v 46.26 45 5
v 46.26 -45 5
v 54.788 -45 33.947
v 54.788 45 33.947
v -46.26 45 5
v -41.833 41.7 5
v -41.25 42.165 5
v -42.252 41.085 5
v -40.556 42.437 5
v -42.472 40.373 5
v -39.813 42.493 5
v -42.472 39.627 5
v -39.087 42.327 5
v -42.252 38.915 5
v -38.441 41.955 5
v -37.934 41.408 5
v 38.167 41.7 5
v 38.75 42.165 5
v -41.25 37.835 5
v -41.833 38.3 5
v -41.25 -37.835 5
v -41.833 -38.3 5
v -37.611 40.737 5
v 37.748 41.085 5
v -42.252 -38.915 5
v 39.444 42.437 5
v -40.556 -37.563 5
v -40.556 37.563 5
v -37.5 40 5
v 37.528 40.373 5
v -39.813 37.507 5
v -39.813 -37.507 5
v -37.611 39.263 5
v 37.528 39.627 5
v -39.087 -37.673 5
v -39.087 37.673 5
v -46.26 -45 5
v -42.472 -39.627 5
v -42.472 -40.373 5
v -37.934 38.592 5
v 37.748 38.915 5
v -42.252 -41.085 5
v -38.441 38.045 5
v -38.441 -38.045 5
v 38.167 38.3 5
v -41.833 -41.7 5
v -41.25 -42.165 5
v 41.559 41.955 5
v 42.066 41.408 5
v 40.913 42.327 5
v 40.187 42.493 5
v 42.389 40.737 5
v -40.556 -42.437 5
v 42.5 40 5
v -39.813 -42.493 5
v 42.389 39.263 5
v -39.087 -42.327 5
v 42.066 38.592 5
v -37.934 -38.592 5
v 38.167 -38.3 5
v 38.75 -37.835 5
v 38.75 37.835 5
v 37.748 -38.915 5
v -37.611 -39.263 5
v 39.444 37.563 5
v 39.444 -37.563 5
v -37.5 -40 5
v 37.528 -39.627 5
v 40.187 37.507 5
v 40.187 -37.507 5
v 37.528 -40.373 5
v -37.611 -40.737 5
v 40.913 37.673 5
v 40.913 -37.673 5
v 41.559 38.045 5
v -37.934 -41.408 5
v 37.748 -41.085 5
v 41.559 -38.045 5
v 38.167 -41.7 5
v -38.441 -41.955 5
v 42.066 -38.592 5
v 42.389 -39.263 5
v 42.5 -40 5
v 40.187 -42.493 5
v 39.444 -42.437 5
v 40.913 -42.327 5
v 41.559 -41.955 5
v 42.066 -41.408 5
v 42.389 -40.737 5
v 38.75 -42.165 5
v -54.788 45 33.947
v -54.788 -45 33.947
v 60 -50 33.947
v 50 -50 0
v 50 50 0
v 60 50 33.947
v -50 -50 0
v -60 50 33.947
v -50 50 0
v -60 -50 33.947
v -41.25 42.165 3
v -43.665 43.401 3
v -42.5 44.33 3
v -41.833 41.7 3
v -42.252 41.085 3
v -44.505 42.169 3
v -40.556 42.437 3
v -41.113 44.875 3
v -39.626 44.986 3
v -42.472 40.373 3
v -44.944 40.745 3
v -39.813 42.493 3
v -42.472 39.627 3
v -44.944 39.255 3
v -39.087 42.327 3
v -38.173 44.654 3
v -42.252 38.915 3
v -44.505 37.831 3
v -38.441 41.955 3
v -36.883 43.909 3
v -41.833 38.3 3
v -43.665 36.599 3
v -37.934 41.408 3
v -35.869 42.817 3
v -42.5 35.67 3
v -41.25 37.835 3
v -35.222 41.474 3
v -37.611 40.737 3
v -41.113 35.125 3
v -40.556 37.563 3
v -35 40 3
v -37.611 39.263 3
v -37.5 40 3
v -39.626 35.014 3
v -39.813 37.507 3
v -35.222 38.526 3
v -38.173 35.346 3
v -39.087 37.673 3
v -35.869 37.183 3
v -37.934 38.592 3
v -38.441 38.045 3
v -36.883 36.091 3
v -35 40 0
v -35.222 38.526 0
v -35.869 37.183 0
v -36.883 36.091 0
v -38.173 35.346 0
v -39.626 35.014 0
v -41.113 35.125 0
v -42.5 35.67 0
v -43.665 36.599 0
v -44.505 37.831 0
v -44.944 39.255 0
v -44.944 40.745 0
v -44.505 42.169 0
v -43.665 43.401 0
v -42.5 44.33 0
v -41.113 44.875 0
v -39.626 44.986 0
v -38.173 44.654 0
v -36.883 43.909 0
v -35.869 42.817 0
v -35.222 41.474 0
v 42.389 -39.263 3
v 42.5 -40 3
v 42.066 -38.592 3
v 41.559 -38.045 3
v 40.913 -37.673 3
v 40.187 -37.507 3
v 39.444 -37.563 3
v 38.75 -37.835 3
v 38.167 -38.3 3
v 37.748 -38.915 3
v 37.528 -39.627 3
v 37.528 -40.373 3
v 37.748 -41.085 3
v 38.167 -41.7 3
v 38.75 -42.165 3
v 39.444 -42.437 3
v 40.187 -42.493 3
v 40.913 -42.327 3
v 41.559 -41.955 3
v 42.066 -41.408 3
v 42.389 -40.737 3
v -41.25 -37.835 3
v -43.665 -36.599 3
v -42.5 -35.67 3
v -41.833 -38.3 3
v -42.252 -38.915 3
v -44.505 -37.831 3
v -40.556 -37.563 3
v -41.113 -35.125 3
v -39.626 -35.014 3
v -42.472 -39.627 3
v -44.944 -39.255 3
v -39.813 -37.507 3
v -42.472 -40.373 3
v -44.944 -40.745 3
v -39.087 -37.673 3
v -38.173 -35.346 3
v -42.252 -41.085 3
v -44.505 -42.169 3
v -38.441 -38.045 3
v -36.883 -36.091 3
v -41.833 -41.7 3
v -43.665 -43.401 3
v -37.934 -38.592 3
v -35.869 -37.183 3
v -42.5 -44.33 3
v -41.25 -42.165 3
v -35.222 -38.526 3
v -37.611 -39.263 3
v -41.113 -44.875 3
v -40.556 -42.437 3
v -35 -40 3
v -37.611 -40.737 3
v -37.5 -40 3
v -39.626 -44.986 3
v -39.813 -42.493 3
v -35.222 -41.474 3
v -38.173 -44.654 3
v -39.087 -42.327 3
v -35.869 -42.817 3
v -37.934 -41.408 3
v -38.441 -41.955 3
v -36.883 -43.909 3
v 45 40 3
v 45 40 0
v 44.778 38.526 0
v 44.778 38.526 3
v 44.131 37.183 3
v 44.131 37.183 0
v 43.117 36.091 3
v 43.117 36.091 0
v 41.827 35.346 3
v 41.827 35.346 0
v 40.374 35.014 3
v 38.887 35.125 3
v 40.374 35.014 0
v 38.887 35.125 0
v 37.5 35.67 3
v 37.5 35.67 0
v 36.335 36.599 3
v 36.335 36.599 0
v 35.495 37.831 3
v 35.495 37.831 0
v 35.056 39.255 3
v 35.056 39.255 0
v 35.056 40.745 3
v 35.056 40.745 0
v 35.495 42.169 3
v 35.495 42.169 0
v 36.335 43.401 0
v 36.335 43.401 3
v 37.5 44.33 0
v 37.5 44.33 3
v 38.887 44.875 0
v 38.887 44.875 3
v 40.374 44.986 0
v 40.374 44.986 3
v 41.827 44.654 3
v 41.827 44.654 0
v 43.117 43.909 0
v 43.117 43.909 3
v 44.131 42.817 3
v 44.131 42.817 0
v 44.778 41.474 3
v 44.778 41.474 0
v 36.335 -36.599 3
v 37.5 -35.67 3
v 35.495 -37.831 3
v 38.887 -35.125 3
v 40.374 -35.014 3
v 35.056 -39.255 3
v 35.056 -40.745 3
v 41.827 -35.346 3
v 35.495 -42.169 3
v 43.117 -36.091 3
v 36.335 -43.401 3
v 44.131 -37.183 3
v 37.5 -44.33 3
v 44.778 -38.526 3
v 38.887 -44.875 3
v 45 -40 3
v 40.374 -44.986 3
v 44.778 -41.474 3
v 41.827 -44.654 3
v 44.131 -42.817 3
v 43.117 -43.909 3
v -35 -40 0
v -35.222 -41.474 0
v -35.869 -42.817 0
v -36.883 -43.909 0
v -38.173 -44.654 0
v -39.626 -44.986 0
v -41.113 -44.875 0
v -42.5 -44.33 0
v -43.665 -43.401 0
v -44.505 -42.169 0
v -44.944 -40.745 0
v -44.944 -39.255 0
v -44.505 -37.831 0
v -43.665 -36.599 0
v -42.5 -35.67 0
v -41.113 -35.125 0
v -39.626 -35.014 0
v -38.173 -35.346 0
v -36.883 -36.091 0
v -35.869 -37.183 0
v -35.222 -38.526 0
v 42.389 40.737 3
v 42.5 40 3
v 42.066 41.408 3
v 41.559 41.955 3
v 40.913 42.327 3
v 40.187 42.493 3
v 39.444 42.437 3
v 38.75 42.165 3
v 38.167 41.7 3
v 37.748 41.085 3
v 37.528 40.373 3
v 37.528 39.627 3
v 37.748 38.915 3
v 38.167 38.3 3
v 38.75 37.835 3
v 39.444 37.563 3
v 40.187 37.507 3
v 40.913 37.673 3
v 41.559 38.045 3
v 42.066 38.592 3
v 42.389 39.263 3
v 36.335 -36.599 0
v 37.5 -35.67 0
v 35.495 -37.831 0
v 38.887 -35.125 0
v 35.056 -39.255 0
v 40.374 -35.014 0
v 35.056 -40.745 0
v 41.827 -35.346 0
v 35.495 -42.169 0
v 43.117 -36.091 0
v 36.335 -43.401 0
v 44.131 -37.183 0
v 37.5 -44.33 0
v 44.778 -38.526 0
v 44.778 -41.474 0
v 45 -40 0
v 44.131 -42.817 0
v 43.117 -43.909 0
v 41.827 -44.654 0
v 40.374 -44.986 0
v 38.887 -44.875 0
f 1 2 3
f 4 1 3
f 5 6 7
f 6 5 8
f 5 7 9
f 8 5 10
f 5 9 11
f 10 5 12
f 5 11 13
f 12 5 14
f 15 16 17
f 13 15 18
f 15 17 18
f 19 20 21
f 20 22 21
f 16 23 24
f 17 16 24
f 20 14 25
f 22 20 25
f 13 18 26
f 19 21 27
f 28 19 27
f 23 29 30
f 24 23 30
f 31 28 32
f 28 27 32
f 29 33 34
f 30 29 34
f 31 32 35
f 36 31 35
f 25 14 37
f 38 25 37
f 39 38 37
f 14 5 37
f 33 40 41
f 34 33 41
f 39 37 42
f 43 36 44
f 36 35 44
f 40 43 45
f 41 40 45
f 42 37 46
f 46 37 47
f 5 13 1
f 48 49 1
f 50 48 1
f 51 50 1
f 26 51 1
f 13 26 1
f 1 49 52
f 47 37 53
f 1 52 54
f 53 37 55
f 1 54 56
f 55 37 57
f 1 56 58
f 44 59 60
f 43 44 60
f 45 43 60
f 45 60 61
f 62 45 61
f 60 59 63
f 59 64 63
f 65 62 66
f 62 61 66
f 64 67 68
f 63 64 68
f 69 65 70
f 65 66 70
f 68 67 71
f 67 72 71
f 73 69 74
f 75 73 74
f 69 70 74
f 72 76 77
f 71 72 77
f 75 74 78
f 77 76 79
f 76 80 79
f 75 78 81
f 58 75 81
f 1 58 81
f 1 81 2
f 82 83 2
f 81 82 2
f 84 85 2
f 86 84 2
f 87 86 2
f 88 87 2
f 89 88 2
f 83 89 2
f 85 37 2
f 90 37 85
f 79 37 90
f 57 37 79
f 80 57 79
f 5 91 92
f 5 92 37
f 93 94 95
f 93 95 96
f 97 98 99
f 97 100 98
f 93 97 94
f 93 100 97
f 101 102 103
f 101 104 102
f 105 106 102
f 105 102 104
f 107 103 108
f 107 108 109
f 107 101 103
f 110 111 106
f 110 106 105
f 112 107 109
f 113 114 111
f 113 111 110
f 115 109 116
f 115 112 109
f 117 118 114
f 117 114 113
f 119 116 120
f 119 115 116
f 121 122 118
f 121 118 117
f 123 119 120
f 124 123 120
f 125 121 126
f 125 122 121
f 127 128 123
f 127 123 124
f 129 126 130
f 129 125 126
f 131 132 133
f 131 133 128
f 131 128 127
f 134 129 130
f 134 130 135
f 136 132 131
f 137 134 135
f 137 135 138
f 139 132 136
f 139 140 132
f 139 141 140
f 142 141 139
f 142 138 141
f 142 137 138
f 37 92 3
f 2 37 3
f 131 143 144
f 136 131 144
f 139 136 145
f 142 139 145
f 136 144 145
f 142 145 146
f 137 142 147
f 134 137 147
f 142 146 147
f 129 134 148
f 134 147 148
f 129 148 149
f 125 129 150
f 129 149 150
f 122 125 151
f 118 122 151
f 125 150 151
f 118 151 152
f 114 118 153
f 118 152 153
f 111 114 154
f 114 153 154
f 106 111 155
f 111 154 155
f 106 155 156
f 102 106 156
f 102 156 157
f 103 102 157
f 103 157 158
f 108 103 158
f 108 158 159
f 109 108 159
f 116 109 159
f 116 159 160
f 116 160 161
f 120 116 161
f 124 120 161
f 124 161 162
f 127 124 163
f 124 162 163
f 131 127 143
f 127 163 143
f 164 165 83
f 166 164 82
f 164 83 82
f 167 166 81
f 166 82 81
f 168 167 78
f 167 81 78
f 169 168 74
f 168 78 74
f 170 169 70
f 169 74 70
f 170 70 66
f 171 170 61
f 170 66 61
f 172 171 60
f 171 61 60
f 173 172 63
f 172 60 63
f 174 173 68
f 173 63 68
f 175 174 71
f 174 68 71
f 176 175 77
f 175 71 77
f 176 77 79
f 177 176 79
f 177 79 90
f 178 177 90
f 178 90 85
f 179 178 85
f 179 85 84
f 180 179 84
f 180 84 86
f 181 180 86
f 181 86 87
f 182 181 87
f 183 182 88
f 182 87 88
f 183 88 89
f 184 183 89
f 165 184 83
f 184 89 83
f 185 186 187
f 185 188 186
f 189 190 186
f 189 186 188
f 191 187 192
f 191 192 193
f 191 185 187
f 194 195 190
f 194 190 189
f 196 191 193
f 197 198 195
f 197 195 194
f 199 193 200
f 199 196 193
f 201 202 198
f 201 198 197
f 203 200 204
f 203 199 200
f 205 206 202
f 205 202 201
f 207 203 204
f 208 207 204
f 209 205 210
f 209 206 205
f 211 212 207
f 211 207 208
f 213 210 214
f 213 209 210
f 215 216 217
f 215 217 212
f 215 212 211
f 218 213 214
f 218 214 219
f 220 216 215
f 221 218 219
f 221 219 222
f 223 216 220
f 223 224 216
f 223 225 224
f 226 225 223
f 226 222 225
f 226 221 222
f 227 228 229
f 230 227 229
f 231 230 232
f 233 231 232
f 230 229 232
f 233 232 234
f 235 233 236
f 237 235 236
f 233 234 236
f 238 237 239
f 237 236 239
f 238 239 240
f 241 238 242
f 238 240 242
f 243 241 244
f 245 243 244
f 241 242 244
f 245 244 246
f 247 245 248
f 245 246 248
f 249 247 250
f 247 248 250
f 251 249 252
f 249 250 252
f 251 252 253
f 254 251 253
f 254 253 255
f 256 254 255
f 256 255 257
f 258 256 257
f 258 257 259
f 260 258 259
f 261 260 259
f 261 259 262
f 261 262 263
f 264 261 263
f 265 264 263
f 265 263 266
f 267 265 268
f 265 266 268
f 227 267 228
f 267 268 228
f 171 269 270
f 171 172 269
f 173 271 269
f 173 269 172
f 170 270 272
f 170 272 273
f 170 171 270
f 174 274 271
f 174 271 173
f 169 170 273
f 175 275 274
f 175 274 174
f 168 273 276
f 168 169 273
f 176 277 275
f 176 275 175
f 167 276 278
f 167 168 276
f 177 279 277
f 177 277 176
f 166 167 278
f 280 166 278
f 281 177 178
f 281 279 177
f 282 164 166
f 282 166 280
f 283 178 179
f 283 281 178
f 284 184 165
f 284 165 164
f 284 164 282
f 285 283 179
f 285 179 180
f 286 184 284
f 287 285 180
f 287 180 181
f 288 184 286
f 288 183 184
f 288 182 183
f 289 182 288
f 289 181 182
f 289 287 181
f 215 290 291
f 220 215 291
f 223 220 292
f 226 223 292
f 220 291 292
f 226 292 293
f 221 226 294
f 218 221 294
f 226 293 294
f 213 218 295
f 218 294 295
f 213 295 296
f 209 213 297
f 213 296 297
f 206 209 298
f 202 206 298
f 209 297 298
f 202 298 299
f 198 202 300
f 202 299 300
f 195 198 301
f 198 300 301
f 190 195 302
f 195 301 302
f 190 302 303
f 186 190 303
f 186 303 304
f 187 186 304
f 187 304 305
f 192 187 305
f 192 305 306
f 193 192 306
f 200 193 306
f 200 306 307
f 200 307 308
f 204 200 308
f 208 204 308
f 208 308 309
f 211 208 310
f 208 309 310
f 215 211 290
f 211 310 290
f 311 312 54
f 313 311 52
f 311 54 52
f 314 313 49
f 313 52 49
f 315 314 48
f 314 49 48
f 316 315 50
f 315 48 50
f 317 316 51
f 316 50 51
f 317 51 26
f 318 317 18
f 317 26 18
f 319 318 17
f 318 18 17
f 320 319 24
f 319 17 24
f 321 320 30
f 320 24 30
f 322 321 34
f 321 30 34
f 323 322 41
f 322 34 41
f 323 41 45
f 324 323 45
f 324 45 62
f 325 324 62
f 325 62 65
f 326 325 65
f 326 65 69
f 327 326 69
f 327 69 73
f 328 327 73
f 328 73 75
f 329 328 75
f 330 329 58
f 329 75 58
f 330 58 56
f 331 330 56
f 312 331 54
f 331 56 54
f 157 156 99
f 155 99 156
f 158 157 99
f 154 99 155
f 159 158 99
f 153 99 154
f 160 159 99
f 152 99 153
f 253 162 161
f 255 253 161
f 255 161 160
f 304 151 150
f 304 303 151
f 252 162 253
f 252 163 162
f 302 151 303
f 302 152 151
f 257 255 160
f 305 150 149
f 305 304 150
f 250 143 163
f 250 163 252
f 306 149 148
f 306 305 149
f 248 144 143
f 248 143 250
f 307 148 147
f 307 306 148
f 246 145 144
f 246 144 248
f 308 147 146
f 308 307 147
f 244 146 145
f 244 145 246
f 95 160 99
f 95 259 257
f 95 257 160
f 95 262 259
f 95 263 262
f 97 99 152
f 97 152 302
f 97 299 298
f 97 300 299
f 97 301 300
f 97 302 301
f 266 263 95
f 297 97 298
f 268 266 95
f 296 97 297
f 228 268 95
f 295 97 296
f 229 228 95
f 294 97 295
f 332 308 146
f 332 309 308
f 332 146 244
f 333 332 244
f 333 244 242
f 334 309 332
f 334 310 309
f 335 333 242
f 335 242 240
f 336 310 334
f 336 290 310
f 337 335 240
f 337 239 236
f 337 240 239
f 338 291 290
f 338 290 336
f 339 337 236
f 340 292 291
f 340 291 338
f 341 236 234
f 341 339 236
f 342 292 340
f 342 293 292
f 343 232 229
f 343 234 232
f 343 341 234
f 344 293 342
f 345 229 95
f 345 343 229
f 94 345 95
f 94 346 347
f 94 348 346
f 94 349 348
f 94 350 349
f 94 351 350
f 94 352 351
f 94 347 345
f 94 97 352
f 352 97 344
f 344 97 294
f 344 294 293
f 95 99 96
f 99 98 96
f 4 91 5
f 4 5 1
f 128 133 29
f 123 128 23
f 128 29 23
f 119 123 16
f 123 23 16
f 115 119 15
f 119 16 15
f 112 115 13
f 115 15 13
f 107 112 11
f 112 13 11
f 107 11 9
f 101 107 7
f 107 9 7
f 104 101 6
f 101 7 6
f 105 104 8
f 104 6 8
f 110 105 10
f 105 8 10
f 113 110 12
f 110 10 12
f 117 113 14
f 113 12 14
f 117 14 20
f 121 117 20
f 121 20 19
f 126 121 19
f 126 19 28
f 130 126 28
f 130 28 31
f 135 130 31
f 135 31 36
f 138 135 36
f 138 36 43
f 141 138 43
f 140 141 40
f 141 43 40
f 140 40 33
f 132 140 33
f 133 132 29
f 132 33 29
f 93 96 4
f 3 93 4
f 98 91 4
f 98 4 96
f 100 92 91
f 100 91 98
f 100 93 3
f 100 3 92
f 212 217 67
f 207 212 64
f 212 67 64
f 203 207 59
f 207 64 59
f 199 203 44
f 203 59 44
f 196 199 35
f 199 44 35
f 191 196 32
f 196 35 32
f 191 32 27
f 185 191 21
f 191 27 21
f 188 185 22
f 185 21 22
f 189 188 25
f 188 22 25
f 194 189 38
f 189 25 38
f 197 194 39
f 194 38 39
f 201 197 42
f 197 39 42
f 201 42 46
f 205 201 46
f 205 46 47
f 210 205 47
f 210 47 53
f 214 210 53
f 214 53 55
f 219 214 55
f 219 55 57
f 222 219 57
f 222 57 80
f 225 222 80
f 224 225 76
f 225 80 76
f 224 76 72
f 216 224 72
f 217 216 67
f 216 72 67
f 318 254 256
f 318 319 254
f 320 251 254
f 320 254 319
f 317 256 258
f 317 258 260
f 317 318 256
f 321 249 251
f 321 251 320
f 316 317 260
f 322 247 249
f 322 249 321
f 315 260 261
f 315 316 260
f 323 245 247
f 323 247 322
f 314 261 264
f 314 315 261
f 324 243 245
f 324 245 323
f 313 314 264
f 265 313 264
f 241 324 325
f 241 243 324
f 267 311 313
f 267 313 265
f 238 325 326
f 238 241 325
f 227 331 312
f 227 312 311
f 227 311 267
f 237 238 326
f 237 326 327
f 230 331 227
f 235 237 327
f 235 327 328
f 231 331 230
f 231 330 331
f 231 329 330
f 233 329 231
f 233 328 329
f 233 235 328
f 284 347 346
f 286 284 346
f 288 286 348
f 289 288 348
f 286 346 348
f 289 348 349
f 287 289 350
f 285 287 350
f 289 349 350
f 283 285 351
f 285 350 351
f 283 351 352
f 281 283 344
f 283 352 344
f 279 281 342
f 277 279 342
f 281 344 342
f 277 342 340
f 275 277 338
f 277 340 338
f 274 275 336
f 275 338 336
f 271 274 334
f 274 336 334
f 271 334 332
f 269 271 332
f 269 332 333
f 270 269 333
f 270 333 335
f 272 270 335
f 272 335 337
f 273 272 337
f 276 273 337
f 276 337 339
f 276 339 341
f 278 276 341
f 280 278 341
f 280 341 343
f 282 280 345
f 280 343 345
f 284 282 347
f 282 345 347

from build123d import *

# Parameters (mm, degrees)
F1_DEPTH      = 50
F1_DEPTH_BACK = 50
F2_T          = -5
F3_R          = 2.5
F4_DEPTH      = 5
F5_R          = 5
F5_R_2        = 2.5
F6_DEPTH      = 3


with BuildPart() as f1:
    # F0 (on Front) → F1 (new body, two sides)
    with BuildSketch(Plane.XZ) as f1_sk:
        Polygon((-50, 0), (50, 0), (60, 33.947153), (-60, 33.947153), align=None)
    extrude(amount=F1_DEPTH)
    extrude(f1_sk.sketch, amount=-F1_DEPTH_BACK)

    # F2
    f2_openings = [f1.faces().sort_by_distance(p)[0] for p in [
        (0, 0, 33.947153),
    ]]
    offset(amount=F2_T, openings=f2_openings)

    # F3 (on face) → F4 (cut, through all)
    with BuildSketch(Plane.XY.offset(5)):
        with Locations((-40, 40)):
            Circle(F3_R)
        with Locations((-40, -40)):
            Circle(F3_R)
        with Locations((40, -40)):
            Circle(F3_R)
        with Locations((40, 40)):
            Circle(F3_R)
    extrude(amount=-F4_DEPTH, mode=Mode.SUBTRACT)

    # F5 (on face) → F6 (cut)
    with BuildSketch(Plane(origin=(0, 0, 0), x_dir=(1, 0, 0), z_dir=(0, 0, -1))):
        with Locations((-40, 40)):
            Circle(F5_R)
        with Locations((-40, 40)):
            Circle(F5_R_2, mode=Mode.SUBTRACT)
        with Locations((40, 40)):
            Circle(F5_R)
        with Locations((40, 40)):
            Circle(F5_R_2, mode=Mode.SUBTRACT)
        with Locations((40, -40)):
            Circle(F5_R)
        with Locations((40, -40)):
            Circle(F5_R_2, mode=Mode.SUBTRACT)
        with Locations((-40, -40)):
            Circle(F5_R)
        with Locations((-40, -40)):
            Circle(F5_R_2, mode=Mode.SUBTRACT)
    extrude(amount=-F6_DEPTH, mode=Mode.SUBTRACT)


solid = f1.part
